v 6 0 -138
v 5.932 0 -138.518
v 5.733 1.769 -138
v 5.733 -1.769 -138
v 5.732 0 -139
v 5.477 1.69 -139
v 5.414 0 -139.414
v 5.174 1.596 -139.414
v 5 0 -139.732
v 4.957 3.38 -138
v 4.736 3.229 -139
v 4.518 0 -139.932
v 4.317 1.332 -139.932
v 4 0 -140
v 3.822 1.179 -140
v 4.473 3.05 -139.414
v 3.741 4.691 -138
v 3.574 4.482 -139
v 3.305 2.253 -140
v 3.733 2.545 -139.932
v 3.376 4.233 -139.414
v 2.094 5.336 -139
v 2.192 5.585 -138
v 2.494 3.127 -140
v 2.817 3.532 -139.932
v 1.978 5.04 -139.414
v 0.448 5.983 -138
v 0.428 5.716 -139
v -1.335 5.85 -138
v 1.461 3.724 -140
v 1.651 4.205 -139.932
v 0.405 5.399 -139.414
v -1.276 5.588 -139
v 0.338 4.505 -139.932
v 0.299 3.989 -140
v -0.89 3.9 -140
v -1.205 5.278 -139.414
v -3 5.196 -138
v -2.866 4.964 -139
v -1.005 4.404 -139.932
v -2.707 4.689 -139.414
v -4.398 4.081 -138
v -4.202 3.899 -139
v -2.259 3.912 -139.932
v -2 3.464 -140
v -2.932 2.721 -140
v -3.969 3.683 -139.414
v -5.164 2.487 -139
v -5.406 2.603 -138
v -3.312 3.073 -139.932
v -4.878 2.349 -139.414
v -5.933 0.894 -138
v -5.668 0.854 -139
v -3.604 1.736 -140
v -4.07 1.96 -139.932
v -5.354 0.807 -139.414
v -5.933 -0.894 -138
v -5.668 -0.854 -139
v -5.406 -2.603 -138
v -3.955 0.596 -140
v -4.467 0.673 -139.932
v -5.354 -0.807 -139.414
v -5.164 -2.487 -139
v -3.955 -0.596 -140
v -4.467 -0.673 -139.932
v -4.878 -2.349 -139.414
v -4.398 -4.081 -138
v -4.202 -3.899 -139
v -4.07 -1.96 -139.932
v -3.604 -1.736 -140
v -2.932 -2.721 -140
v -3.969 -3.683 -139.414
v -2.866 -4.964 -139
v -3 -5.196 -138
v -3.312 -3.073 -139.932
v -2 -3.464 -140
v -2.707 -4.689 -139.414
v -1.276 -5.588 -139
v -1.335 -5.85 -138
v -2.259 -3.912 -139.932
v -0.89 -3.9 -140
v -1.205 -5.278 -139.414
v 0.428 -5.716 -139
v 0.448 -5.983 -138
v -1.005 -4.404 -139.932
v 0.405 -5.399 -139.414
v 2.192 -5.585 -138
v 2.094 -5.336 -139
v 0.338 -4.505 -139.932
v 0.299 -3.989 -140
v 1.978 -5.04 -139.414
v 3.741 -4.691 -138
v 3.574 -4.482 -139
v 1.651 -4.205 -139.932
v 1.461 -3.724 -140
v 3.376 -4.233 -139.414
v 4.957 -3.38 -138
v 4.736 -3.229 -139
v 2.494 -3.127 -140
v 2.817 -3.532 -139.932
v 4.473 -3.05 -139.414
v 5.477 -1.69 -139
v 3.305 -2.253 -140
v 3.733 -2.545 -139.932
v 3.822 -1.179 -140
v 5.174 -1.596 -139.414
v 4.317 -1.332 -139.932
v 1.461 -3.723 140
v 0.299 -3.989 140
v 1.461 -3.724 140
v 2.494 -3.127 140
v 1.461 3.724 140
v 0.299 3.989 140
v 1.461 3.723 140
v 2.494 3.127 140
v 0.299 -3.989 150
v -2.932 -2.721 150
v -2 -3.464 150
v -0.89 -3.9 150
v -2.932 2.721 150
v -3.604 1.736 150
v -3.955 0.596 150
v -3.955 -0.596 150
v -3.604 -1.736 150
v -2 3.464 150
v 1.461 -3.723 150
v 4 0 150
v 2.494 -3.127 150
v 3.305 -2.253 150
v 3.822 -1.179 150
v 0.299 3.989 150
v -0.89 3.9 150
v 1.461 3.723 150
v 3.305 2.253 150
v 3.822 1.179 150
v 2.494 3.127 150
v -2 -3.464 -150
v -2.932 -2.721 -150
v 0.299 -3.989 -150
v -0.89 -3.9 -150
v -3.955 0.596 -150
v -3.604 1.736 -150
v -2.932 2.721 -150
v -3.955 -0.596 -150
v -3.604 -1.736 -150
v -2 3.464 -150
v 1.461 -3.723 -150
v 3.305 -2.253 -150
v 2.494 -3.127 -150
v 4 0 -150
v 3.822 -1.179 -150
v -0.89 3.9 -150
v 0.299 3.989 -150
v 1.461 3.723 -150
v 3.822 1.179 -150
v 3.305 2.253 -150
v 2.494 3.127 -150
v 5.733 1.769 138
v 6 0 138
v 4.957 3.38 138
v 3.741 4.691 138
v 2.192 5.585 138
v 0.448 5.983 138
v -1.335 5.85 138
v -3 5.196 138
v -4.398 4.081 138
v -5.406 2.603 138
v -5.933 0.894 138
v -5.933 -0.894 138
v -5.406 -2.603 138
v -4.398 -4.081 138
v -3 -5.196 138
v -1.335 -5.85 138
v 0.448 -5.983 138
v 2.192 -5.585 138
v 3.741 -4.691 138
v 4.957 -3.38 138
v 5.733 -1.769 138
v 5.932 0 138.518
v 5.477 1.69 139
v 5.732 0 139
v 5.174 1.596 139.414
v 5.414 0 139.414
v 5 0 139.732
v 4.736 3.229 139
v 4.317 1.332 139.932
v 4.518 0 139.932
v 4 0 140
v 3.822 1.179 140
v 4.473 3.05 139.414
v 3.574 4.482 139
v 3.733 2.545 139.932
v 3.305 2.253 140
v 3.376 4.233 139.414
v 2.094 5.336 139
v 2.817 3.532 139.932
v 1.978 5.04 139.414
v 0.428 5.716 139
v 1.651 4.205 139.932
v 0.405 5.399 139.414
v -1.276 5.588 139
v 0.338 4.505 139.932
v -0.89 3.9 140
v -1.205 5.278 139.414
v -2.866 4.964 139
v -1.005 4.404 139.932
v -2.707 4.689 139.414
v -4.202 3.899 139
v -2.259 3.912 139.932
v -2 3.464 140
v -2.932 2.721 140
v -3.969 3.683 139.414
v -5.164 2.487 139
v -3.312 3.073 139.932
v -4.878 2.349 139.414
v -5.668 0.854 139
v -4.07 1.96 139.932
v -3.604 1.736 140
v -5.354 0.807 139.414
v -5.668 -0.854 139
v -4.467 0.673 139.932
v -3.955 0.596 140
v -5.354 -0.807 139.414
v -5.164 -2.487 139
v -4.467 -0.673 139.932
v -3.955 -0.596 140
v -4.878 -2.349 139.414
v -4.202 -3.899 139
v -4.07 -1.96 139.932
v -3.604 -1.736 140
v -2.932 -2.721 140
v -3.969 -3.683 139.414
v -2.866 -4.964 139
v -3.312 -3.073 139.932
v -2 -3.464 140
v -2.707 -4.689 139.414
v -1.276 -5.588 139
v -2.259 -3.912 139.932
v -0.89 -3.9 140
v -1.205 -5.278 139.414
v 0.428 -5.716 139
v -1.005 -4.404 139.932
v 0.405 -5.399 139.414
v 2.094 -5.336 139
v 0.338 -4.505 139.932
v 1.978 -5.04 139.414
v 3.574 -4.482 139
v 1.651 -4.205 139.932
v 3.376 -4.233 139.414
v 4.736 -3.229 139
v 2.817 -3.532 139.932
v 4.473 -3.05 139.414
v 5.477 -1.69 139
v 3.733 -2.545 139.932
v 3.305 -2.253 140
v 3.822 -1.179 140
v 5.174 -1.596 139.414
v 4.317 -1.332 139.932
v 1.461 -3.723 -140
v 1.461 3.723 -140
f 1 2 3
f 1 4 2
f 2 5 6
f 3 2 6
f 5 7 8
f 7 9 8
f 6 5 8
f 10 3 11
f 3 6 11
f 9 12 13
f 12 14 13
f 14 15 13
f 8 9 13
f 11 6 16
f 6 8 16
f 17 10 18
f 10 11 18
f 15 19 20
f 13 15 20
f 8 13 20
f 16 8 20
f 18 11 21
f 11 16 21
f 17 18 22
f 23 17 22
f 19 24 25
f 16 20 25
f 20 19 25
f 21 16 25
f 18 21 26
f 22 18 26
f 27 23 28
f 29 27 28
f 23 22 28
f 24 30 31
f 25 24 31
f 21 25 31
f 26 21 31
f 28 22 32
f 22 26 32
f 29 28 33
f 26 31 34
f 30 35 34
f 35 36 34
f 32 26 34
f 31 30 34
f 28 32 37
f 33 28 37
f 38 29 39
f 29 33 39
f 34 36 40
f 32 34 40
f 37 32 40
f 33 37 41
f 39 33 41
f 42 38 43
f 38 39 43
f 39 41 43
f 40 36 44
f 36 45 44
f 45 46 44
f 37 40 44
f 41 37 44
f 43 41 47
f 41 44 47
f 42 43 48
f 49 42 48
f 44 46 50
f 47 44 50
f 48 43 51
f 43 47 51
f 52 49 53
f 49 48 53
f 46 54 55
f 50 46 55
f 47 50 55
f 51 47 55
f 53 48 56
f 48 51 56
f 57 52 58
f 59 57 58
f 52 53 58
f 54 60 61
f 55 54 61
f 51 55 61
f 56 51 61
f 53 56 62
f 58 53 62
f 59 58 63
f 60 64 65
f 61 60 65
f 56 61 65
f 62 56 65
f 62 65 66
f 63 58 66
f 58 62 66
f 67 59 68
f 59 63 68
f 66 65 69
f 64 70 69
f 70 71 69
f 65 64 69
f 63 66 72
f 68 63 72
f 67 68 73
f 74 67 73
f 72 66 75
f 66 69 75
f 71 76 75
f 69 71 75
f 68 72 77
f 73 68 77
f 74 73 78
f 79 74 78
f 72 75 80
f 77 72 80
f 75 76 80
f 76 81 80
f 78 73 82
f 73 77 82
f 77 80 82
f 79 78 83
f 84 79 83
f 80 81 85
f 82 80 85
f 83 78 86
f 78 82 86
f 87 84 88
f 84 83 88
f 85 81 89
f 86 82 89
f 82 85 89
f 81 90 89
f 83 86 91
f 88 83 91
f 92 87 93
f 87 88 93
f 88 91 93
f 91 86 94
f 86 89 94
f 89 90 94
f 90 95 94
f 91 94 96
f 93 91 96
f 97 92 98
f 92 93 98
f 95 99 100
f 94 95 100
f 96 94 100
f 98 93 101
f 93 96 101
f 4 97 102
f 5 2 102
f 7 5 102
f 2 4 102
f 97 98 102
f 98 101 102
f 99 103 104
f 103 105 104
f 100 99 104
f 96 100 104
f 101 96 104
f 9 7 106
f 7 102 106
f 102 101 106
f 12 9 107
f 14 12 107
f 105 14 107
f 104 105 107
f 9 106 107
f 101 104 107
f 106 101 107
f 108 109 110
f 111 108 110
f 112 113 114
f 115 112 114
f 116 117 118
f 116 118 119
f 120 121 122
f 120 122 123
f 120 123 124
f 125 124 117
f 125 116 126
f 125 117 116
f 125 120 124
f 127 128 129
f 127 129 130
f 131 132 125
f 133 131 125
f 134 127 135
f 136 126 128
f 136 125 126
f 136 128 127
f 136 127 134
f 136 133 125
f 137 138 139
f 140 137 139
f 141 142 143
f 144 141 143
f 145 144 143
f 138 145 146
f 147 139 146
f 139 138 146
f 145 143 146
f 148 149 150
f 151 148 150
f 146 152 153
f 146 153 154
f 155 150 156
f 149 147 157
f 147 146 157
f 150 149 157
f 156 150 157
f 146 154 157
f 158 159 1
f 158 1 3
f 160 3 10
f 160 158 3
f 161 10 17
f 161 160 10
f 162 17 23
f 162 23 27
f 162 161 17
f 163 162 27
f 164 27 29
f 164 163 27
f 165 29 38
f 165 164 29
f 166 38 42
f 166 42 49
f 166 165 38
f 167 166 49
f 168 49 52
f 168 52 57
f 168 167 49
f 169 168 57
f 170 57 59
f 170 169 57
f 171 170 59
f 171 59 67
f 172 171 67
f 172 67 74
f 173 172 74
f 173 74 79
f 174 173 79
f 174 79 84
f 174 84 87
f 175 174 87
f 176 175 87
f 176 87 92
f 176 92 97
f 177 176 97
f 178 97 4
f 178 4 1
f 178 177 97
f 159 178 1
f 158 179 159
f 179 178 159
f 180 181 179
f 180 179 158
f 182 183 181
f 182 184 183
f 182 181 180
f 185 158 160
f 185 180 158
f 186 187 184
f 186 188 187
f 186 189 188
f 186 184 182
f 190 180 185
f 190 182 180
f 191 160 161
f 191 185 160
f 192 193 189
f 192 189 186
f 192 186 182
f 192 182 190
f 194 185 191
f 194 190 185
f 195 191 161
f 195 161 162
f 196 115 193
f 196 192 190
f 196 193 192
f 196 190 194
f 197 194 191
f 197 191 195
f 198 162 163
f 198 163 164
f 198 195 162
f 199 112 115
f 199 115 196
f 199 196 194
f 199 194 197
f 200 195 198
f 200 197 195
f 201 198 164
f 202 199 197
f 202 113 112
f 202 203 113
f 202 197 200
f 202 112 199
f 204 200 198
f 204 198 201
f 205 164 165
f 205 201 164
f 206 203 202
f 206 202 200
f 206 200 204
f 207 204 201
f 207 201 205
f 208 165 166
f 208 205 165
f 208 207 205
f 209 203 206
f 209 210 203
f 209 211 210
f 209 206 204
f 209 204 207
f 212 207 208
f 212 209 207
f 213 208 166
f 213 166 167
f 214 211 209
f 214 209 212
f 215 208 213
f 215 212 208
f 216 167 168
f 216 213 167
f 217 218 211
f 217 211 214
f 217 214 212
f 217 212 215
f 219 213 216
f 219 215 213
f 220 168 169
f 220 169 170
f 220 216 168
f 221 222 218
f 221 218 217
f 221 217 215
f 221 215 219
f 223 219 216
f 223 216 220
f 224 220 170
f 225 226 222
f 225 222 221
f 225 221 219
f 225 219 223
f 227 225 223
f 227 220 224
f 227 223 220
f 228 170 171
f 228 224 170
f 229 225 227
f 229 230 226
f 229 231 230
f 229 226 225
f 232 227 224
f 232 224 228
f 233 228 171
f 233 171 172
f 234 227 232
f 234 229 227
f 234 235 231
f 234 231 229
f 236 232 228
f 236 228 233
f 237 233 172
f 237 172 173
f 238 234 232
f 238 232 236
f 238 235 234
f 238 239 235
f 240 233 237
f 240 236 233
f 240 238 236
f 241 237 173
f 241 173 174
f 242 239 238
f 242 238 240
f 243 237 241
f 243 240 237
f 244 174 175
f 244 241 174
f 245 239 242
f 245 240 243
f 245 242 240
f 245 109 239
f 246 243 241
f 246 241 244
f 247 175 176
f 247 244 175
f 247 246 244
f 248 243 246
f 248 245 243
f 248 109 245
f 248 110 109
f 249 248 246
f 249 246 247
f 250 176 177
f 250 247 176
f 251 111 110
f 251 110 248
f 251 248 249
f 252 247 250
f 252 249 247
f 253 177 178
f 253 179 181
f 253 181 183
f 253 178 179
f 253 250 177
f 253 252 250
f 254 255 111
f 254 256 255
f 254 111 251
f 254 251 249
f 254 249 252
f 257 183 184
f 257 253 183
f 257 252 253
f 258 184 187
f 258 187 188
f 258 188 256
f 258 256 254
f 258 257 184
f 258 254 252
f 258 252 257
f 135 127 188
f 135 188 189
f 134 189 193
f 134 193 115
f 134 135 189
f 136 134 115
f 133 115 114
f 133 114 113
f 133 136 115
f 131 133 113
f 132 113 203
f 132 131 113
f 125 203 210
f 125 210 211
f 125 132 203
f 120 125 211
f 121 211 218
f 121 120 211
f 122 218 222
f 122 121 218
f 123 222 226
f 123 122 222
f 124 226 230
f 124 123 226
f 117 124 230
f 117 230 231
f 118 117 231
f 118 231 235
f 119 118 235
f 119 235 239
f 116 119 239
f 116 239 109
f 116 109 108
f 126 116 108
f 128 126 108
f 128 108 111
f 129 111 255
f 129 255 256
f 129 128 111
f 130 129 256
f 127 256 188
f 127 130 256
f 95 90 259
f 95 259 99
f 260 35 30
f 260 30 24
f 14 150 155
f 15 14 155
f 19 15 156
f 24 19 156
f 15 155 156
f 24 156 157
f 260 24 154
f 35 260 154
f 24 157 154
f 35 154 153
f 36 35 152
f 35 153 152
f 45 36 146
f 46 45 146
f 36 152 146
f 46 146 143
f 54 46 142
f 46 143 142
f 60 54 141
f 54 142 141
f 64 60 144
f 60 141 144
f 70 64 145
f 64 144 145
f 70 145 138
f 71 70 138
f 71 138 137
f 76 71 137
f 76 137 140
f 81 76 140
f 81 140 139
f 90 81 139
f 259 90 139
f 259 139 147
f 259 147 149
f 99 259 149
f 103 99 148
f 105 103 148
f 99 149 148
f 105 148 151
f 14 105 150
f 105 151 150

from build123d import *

# Parameters (mm, degrees)
SKETCH1_R            = 6
BOSS_EXTRUDE1_DEPTH  = 150
SKETCH2_R            = 6
SKETCH2_R_2          = 4
CUT_EXTRUDE1_DEPTH   = 10
FILLET1_R            = 2
FILLET1_OF_MIRROR1_R = 2


with BuildPart() as part:
    # Sketch1 → Boss-Extrude1 (new, symmetric)
    with BuildSketch(Plane.XY):
        Circle(SKETCH1_R)
    extrude(amount=BOSS_EXTRUDE1_DEPTH, both=True)

    # Sketch2 → Cut-Extrude1 (cut)
    with BuildSketch(Plane.XY.offset(150)):
        Circle(SKETCH2_R)
        Circle(SKETCH2_R_2, mode=Mode.SUBTRACT)
    cut_extrude1 = extrude(amount=-CUT_EXTRUDE1_DEPTH, mode=Mode.SUBTRACT)

    # Fillet1
    fillet1_edges = [part.edges().sort_by_distance(p)[0] for p in [
        (-6, 0, 140),
    ]]
    fillet(fillet1_edges, radius=FILLET1_R - 0.0001)  # a hair under: the kernel refuses the full size

    # Mirror1: Cut-Extrude1 across plane
    add(cut_extrude1.mirror(Plane.XY), mode=Mode.SUBTRACT)

    # Fillet1 of Mirror1
    fillet1_of_mirror1_edges = [part.edges().sort_by_distance(p)[0] for p in [
        (-6, 0, -140),
    ]]
    fillet(fillet1_of_mirror1_edges, radius=FILLET1_OF_MIRROR1_R - 0.0001)  # a hair under: the kernel refuses the full size


solid = part.part
